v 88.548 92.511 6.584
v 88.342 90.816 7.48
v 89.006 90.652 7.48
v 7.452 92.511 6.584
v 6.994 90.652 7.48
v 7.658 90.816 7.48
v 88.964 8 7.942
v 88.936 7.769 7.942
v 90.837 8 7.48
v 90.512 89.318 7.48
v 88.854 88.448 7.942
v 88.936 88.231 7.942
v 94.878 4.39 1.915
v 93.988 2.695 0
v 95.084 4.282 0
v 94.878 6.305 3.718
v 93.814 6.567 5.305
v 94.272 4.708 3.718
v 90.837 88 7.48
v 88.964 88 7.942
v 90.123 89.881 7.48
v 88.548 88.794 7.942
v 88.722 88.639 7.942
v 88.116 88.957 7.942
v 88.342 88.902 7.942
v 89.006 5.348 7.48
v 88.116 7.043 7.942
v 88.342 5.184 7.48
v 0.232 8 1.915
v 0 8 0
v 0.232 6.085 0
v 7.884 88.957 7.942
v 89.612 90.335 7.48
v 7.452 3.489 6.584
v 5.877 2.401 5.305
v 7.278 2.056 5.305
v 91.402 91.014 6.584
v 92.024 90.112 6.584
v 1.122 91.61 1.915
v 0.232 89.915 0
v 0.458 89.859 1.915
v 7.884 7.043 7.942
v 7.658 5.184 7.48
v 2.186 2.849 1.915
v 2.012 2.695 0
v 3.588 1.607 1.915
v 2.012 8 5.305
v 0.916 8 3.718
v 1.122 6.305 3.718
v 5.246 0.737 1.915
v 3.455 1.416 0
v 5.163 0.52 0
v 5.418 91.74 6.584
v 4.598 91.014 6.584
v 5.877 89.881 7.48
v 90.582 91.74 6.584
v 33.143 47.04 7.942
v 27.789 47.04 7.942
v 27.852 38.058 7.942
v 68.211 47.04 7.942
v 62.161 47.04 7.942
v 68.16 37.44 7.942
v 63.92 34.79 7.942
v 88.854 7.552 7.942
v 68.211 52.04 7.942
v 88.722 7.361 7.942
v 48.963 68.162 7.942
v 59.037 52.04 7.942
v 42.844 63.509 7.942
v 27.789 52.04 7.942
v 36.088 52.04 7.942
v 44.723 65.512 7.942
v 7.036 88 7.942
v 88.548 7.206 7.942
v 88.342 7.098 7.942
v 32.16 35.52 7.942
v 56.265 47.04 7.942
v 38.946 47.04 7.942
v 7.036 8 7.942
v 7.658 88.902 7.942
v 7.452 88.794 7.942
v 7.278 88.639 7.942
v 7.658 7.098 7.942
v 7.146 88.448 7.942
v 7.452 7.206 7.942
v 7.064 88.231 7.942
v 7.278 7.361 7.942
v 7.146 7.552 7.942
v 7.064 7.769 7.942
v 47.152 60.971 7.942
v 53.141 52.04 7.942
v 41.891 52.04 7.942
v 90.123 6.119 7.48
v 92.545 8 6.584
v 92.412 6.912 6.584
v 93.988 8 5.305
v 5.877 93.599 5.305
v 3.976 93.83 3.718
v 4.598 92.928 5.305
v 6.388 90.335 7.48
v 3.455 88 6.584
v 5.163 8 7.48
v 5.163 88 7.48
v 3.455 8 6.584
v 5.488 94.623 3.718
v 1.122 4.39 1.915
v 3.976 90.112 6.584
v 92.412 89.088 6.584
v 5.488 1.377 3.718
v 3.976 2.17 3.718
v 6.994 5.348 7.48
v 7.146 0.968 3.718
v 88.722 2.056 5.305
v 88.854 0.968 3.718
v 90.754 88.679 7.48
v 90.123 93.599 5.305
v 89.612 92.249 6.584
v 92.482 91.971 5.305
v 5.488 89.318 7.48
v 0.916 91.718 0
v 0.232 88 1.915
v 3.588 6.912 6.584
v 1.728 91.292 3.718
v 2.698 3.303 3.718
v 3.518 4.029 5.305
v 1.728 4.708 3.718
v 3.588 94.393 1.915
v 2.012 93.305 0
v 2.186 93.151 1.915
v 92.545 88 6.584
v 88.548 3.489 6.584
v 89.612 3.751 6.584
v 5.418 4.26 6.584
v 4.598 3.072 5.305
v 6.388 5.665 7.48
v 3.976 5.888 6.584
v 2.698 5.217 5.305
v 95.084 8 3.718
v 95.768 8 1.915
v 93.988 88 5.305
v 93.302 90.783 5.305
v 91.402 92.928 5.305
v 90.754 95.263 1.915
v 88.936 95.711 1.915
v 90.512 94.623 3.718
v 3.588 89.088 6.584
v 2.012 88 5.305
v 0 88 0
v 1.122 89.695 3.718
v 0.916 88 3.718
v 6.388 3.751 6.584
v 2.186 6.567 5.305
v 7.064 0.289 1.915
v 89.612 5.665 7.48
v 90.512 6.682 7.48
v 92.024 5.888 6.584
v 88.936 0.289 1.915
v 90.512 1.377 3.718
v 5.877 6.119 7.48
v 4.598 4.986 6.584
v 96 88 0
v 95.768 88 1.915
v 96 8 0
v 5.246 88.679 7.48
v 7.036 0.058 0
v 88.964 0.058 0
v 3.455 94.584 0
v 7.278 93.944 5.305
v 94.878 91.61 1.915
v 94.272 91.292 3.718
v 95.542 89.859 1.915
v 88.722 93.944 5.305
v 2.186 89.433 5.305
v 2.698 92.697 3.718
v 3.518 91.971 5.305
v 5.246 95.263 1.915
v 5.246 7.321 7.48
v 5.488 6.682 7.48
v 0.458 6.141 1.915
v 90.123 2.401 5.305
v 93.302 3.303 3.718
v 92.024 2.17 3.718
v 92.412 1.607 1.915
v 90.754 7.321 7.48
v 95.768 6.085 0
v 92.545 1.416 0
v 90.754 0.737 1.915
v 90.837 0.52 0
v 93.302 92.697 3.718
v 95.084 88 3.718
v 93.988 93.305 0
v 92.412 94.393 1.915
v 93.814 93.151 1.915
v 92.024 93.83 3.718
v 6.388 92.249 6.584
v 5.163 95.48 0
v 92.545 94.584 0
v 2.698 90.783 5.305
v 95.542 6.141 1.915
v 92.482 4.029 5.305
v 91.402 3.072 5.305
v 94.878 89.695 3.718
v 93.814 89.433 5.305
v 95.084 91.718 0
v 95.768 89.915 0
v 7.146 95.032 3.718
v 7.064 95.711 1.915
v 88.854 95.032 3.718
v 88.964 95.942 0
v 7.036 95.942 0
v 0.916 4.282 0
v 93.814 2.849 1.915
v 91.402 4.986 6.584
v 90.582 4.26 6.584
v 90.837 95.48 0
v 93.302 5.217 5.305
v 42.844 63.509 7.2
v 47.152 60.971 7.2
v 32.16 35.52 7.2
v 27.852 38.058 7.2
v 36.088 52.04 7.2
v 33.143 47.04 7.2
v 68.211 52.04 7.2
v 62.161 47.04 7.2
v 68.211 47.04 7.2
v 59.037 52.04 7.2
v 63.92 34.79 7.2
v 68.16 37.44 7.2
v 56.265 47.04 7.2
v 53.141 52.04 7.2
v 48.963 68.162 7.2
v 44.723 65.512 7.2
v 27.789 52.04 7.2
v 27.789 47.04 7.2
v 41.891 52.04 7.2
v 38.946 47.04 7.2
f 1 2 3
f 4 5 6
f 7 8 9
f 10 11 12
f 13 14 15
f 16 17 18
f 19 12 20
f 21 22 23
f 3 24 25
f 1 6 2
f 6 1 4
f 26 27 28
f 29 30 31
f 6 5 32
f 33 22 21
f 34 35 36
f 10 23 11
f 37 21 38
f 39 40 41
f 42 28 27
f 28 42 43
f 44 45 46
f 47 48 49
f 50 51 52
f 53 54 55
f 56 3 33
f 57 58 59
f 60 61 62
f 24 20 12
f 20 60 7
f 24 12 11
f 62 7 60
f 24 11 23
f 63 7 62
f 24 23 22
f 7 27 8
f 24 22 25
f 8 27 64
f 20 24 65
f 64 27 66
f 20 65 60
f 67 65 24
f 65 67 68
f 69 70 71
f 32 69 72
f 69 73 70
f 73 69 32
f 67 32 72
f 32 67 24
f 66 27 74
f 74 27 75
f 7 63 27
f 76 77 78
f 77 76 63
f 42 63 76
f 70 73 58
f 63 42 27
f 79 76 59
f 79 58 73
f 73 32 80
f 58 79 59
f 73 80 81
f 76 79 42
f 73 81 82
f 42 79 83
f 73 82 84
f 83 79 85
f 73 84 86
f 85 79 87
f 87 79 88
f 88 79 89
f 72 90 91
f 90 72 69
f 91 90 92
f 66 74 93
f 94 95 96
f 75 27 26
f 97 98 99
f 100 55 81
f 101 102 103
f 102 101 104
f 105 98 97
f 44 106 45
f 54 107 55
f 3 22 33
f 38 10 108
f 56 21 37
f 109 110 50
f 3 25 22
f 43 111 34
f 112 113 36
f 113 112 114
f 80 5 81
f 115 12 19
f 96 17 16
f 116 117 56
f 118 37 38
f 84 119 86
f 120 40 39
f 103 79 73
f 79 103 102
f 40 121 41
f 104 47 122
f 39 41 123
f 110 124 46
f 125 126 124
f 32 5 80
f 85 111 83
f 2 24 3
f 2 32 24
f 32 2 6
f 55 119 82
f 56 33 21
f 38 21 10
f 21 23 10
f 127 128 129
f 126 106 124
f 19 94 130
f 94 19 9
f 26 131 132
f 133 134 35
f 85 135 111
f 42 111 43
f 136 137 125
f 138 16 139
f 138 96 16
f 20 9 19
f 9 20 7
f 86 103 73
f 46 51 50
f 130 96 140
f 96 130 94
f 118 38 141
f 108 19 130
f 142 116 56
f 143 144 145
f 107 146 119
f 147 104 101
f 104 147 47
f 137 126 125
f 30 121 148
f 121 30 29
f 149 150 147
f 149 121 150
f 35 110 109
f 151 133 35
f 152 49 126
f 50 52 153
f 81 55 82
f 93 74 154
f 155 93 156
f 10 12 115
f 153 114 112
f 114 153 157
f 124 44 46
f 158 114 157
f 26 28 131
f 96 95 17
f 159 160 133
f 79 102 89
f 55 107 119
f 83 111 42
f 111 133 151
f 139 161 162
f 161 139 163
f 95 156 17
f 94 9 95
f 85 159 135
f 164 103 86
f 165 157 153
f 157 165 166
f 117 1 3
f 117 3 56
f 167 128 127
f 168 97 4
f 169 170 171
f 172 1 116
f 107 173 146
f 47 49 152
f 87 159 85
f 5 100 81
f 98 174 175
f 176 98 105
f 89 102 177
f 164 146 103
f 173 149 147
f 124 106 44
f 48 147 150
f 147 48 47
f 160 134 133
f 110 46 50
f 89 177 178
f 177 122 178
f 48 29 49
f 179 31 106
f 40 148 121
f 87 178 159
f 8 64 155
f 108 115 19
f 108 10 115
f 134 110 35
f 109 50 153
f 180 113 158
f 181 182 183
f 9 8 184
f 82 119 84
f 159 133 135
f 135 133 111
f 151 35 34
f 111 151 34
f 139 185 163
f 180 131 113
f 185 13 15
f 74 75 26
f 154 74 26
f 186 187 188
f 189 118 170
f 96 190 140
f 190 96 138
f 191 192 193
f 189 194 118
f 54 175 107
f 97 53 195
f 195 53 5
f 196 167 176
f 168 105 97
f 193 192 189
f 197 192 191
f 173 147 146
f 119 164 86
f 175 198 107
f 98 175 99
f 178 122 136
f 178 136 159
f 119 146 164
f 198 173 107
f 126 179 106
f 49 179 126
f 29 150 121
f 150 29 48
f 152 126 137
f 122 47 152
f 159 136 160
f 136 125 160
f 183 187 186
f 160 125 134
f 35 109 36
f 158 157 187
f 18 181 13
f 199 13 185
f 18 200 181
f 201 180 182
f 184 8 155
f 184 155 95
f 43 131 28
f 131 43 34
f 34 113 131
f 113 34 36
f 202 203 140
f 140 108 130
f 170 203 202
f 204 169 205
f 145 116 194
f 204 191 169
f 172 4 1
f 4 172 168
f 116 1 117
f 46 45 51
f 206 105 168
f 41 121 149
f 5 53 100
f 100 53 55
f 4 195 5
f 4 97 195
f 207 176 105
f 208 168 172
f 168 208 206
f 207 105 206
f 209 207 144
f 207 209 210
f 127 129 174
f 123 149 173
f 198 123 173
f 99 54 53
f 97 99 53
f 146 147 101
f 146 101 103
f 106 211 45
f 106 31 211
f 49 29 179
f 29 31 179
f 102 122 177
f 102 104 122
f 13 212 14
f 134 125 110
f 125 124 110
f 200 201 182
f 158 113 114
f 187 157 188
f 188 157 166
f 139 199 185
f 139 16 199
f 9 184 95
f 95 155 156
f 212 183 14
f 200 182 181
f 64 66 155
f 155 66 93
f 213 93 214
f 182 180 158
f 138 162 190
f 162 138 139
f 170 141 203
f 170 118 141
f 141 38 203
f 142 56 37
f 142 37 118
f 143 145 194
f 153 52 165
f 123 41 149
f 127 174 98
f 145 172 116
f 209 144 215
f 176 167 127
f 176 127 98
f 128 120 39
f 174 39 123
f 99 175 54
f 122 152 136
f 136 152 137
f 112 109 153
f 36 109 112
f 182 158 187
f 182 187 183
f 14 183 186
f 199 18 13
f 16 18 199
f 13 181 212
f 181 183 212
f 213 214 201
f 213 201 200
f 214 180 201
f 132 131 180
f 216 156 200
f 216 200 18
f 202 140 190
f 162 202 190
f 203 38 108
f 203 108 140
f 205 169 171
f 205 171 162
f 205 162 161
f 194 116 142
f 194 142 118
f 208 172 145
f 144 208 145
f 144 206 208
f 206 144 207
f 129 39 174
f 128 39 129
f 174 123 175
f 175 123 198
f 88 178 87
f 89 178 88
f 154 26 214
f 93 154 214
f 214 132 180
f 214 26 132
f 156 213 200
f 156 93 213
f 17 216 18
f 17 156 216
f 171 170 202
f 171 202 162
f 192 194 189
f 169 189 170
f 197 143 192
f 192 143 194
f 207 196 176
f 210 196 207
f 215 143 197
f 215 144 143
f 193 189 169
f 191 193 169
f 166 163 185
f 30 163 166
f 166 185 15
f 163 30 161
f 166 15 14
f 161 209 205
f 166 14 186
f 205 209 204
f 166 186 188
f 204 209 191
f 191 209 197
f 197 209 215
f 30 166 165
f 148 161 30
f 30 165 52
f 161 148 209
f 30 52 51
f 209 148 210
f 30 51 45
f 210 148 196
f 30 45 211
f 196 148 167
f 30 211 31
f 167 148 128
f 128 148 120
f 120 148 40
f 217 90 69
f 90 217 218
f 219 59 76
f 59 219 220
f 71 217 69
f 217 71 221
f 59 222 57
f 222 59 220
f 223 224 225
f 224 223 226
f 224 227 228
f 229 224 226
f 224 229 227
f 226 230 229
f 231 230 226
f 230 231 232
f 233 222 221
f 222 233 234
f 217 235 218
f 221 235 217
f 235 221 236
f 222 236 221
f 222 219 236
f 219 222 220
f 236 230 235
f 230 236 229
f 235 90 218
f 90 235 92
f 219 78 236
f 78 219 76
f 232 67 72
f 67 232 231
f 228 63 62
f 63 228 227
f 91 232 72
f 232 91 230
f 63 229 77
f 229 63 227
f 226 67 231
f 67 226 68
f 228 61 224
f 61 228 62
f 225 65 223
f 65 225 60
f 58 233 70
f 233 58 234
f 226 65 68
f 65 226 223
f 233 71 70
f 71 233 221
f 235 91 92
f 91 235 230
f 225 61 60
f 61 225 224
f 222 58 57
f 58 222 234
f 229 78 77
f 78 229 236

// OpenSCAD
//CUSTOMIZER VARIABLES

// edge length (width/height)
size = 80;

// for the "A" character
engrave_depth = .8;

//CUSTOMIZER VARIABLES END


height = size/10;
radius = size/10;
outer_size = size + 2*radius;
engrave_thickness = outer_size / 19.2;

l_a = outer_size/3.25;
l_b = outer_size/2.65;
l_c = outer_size/2.375;

a_a = 59.5 * 1;
a_b = 122 * 1;
a_c = 0 * 1;

difference() {
    color("lightgray") translate([radius,radius,-height]) difference() {
        // create a rounded cube
        translate([0,0,height]) {
            hull() {
                sphere(r=radius);
                translate([size,0,0]) sphere(r=radius);
                translate([size,size,0]) sphere(r=radius);
                translate([0,size,0]) sphere(r=radius);
            }
        }

        // cut away the lower half
        translate([-radius,-radius,0]) cube([size+radius*2,size+radius*2,height]);
    }

    color("gray") union() {
        // the three bars representing the "A"
        translate([outer_size*0.335,outer_size*0.37,height-engrave_depth])
            rotate([0,0,a_a])
                cube([l_a, engrave_thickness, engrave_depth]);

        translate([outer_size*0.71,outer_size*0.39,height-engrave_depth])
            rotate([0,0,a_b])
                cube([l_b, engrave_thickness, engrave_depth]);

        translate([(outer_size-l_c)/2,outer_size*0.49,height-engrave_depth])
            rotate([0,0,a_c])
                cube([l_c, engrave_thickness, engrave_depth]);


    }
}
